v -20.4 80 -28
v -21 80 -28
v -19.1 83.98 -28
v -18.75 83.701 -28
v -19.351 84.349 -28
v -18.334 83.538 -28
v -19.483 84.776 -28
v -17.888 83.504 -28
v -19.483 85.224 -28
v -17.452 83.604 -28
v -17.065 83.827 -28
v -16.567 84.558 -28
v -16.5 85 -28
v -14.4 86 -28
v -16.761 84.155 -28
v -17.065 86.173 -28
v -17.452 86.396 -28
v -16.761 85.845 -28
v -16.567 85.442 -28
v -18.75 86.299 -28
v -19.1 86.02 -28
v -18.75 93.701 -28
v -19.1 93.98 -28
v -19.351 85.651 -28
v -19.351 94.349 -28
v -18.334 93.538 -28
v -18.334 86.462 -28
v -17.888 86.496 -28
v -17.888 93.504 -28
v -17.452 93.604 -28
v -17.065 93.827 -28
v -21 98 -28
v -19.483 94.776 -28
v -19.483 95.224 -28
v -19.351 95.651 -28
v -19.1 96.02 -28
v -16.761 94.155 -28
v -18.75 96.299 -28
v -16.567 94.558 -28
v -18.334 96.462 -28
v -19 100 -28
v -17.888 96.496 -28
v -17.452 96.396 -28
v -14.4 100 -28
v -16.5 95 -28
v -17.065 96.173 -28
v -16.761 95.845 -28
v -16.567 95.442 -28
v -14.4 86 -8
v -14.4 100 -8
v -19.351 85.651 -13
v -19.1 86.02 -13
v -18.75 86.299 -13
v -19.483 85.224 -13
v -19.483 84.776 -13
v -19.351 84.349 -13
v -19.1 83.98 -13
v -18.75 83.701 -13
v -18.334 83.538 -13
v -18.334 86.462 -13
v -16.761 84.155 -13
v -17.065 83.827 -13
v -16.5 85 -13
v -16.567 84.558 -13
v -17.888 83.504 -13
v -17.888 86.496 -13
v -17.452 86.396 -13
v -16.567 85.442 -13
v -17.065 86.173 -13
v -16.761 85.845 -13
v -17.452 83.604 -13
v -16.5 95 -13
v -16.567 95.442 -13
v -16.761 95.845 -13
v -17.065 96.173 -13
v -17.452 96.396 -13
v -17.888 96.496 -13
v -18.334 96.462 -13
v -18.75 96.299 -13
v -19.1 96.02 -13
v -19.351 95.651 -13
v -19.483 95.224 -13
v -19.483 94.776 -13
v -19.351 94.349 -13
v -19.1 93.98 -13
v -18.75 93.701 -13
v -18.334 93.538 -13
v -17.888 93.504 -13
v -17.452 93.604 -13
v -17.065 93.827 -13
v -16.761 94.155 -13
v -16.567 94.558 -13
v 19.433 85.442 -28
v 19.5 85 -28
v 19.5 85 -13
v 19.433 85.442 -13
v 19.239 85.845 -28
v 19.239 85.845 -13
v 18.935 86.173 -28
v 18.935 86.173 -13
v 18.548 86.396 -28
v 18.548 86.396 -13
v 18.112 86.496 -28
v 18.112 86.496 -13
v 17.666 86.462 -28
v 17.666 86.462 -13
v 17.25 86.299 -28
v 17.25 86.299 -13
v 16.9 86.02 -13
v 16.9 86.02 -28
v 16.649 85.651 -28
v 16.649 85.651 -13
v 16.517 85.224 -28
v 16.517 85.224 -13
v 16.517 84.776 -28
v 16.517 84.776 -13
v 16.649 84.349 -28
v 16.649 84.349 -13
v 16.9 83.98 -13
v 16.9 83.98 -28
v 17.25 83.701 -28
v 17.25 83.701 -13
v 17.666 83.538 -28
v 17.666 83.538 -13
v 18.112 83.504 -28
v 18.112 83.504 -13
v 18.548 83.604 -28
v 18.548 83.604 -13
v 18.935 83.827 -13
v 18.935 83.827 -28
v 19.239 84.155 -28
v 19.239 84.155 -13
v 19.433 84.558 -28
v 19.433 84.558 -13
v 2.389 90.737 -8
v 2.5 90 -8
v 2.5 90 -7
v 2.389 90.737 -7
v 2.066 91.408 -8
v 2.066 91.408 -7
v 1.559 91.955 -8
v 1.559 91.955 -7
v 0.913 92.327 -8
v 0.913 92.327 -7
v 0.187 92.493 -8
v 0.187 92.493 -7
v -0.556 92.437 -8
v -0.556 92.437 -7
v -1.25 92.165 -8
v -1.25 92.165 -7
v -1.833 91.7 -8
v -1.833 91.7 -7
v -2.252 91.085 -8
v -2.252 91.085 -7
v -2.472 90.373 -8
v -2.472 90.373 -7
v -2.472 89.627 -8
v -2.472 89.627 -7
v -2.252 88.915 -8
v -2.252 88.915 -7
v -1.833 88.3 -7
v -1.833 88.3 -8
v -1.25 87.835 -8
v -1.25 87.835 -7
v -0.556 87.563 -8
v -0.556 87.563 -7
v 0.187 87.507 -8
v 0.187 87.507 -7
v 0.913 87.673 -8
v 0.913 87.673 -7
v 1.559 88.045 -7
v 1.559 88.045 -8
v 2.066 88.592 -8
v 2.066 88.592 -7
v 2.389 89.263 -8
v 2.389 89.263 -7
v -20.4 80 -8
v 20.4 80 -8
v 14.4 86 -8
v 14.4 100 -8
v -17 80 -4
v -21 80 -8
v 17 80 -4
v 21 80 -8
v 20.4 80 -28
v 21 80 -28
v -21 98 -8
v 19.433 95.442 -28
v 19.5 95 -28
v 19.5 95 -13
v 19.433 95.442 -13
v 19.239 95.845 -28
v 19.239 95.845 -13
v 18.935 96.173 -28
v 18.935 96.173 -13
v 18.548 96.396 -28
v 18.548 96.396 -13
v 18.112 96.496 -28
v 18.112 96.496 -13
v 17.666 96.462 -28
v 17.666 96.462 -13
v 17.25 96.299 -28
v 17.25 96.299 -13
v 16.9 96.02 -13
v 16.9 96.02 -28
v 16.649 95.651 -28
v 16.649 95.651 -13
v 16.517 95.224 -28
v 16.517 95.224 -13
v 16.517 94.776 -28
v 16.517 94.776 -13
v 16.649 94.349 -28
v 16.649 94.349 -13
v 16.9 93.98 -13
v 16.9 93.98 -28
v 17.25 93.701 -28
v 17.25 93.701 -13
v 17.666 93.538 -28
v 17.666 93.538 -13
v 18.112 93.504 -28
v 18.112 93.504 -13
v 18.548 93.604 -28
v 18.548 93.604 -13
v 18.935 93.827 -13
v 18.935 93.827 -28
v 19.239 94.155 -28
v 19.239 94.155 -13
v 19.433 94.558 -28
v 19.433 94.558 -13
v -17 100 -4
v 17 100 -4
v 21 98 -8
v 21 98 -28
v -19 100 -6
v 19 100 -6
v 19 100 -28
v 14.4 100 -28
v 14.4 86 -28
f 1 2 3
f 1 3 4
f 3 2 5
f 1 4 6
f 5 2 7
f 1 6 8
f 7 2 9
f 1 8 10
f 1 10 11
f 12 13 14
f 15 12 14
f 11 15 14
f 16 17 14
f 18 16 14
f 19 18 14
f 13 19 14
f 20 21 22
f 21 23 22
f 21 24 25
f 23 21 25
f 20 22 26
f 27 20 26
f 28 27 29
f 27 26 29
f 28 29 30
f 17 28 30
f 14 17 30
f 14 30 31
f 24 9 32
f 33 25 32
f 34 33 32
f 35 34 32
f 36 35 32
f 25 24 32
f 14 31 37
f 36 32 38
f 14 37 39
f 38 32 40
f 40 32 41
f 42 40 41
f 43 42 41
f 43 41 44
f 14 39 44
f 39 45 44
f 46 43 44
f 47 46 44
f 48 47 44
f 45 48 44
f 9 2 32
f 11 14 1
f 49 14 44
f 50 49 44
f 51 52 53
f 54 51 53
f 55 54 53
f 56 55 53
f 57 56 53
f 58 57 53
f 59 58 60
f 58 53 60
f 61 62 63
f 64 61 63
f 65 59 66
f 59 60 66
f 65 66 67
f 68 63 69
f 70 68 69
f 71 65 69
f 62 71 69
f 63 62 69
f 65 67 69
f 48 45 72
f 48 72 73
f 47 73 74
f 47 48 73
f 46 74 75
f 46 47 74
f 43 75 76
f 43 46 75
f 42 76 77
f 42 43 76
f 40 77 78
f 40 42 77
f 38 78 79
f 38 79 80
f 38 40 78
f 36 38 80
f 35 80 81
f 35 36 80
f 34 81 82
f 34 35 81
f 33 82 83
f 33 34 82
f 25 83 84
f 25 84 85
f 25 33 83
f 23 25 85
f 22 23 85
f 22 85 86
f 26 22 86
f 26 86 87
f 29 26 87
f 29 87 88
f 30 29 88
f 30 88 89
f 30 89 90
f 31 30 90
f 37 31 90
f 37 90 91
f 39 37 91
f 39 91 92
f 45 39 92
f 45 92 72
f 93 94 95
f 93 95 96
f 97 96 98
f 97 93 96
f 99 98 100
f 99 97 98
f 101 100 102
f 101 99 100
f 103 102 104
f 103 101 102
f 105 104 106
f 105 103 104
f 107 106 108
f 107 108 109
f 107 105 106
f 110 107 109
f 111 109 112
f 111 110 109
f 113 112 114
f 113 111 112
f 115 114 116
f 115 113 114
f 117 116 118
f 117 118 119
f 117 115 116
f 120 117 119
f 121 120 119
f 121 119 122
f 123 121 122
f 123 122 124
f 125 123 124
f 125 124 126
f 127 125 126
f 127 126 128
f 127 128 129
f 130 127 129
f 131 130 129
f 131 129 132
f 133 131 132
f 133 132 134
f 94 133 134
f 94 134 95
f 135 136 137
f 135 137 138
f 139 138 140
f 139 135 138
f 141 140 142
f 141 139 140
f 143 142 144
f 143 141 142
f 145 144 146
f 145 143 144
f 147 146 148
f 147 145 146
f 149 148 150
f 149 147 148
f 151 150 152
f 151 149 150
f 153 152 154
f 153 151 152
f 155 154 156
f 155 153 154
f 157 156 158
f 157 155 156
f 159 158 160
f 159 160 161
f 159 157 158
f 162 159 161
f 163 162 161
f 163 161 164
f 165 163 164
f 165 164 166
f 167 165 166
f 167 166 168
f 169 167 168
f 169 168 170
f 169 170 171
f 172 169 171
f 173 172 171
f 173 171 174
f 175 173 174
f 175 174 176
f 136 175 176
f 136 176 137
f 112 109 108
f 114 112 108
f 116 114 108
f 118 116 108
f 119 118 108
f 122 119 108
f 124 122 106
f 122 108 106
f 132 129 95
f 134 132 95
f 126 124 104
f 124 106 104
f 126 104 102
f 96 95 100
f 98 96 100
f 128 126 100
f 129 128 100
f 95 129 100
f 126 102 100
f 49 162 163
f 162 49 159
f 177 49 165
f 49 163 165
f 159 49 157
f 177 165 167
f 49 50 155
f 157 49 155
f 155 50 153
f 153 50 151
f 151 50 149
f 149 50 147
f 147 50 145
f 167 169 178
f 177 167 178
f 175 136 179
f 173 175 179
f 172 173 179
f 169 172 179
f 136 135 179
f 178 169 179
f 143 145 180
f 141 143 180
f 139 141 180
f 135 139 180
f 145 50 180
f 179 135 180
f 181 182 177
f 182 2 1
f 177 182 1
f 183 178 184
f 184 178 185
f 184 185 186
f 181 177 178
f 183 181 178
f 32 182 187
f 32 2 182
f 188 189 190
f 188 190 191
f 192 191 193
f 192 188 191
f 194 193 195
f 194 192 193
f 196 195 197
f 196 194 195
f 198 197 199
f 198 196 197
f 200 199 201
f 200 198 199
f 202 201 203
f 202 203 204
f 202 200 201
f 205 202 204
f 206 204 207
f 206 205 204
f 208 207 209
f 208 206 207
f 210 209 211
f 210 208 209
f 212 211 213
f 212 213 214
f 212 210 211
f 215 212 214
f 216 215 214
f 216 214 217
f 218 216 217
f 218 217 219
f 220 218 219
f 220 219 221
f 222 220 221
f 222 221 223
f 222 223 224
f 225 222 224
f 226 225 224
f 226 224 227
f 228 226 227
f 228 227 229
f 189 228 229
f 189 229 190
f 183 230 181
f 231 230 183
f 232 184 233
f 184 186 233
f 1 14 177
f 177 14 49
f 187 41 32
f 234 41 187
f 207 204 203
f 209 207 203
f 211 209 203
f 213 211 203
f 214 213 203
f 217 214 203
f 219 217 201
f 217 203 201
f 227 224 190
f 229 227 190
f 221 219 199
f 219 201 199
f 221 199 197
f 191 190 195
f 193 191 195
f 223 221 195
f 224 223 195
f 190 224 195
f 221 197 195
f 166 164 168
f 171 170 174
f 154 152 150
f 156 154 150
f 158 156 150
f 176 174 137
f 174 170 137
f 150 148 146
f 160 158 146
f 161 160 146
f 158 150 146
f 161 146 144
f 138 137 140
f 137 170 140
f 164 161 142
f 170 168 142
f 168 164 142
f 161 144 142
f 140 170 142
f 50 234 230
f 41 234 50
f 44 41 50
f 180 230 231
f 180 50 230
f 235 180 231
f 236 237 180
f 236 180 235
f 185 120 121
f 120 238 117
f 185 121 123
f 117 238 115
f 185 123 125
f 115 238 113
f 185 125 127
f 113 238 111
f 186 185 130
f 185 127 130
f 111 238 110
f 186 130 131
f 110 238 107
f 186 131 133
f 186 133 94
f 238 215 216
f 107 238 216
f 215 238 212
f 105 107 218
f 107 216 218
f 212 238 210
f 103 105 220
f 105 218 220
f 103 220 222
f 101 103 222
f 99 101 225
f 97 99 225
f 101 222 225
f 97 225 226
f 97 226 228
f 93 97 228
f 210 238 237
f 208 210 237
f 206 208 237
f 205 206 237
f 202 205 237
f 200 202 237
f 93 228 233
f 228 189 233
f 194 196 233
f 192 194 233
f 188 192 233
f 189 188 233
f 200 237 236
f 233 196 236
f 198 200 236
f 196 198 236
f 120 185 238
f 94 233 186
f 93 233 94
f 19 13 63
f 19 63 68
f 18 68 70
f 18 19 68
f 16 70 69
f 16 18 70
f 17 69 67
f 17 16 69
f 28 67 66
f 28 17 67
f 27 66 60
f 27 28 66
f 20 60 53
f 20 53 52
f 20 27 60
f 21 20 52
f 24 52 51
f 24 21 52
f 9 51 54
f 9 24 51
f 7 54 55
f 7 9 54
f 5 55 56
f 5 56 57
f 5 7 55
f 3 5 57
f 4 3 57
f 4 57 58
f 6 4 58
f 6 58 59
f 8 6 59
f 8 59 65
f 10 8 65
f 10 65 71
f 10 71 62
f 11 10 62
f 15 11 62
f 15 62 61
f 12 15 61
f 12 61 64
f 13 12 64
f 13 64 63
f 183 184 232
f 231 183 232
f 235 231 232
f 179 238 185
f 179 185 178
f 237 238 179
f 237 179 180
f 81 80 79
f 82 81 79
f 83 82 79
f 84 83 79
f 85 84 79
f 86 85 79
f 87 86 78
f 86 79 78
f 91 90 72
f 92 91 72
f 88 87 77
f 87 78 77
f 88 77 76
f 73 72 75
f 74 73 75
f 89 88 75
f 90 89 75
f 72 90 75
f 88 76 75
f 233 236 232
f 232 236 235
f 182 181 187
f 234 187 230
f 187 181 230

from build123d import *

# Parameters (mm, degrees)
CYLINDER1709_R     = 1.5
CYLINDER1709_DEPTH = 60
CYLINDER1710_R     = 1.5
CYLINDER1710_DEPTH = 60
CYLINDER1702_R     = 1.5
CYLINDER1702_DEPTH = 60
CYLINDER1706_R     = 1.5
CYLINDER1706_DEPTH = 60
CYLINDER1703_R     = 2.5
CYLINDER1703_DEPTH = 48
BOX666_W           = 28.8
BOX666_H           = 34.21
BOX666_DEPTH       = 20
BOX665_W           = 42
BOX665_H           = 20
BOX665_DEPTH       = 24
CHAMFER053_SIZE    = 6
CHAMFER054_SIZE    = 4
CHAMFER056_SIZE    = 2


with BuildPart() as v_lec1709:
    # Cylinder1709 → Cylinder1709 (new body)
    with BuildSketch(Plane(origin=(18, 85, -57), x_dir=(1, 0, 0), z_dir=(0, 0, 1))):
        Circle(CYLINDER1709_R)
    extrude(amount=CYLINDER1709_DEPTH)


with BuildPart() as v_lec1710:
    # Cylinder1710 → Cylinder1710 (new body)
    with BuildSketch(Plane(origin=(-18, 85, -57), x_dir=(1, 0, 0), z_dir=(0, 0, 1))):
        Circle(CYLINDER1710_R)
    extrude(amount=CYLINDER1710_DEPTH)


with BuildPart() as v_lec1702:
    # Cylinder1702 → Cylinder1702 (new body)
    with BuildSketch(Plane(origin=(-18, 95, -57), x_dir=(1, 0, 0), z_dir=(0, 0, 1))):
        Circle(CYLINDER1702_R)
    extrude(amount=CYLINDER1702_DEPTH)


with BuildPart() as compound850:
    # Cylinder1706 → Cylinder1706 (new body)
    with BuildSketch(Plane(origin=(18, 95, -57), x_dir=(1, 0, 0), z_dir=(0, 0, 1))):
        Circle(CYLINDER1706_R)
    extrude(amount=CYLINDER1706_DEPTH)

    # Compound850: union Válec1709, Válec1710, Válec1702
    add(v_lec1709.part)
    add(v_lec1710.part)
    add(v_lec1702.part)


with BuildPart() as compound850_1:
    # Compound850 placement: moved
    add(compound850.part.moved(Location((0, 0, -16))))


with BuildPart() as v_lec1703:
    # Cylinder1703 → Cylinder1703 (new body)
    with BuildSketch(Plane(origin=(0, 90, -55), x_dir=(1, 0, 0), z_dir=(0, 0, 1))):
        Circle(CYLINDER1703_R)
    extrude(amount=CYLINDER1703_DEPTH)


with BuildPart() as compound846:
    # Box666 → Box666 (new body)
    with BuildSketch(Plane(origin=(-14.4, -15.34, 34), x_dir=(1, 0, 0), z_dir=(0, 0, 1))):
        with Locations((14.4, 17.105)):
            Rectangle(BOX666_W, BOX666_H)
    extrude(amount=BOX666_DEPTH)


with BuildPart() as compound846_1:
    # Compound846 placement: moved
    add(compound846.part.moved(Location((0, 90, -83))))


with BuildPart() as chamfer056:
    # Box665 → Box665 (new body)
    with BuildSketch(Plane(origin=(-21, 80, -49), x_dir=(1, 0, 0), z_dir=(0, 0, 1))):
        with Locations((21, 10)):
            Rectangle(BOX665_W, BOX665_H)
    extrude(amount=BOX665_DEPTH)

    # Cut354: cut Compound846
    add(compound846_1.part, mode=Mode.SUBTRACT)


with BuildPart() as chamfer056_1:
    # Cut354 placement: moved
    add(chamfer056.part.moved(Location((0, 0, 21))))

    # Cut352: cut Válec1703
    add(v_lec1703.part, mode=Mode.SUBTRACT)

    # Chamfer053
    chamfer053_edges = [chamfer056_1.edges().sort_by_distance(p)[0] for p in [
        (-14.4, 80, -18),
        (14.4, 80, -18),
    ]]
    chamfer(chamfer053_edges, length=CHAMFER053_SIZE)

    # Cut348: cut Compound850
    add(compound850_1.part, mode=Mode.SUBTRACT)

    # Chamfer054
    chamfer054_edges = [chamfer056_1.edges().sort_by_distance(p)[0] for p in [
        (-21, 90, -4),
        (21, 90, -4),
    ]]
    chamfer(chamfer054_edges, length=CHAMFER054_SIZE)

    # Chamfer056
    chamfer056_edges = [chamfer056_1.edges().sort_by_distance(p)[0] for p in [
        (-21, 100, -18),
        (21, 100, -18),
    ]]
    chamfer(chamfer056_edges, length=CHAMFER056_SIZE)


solid = chamfer056_1.part
